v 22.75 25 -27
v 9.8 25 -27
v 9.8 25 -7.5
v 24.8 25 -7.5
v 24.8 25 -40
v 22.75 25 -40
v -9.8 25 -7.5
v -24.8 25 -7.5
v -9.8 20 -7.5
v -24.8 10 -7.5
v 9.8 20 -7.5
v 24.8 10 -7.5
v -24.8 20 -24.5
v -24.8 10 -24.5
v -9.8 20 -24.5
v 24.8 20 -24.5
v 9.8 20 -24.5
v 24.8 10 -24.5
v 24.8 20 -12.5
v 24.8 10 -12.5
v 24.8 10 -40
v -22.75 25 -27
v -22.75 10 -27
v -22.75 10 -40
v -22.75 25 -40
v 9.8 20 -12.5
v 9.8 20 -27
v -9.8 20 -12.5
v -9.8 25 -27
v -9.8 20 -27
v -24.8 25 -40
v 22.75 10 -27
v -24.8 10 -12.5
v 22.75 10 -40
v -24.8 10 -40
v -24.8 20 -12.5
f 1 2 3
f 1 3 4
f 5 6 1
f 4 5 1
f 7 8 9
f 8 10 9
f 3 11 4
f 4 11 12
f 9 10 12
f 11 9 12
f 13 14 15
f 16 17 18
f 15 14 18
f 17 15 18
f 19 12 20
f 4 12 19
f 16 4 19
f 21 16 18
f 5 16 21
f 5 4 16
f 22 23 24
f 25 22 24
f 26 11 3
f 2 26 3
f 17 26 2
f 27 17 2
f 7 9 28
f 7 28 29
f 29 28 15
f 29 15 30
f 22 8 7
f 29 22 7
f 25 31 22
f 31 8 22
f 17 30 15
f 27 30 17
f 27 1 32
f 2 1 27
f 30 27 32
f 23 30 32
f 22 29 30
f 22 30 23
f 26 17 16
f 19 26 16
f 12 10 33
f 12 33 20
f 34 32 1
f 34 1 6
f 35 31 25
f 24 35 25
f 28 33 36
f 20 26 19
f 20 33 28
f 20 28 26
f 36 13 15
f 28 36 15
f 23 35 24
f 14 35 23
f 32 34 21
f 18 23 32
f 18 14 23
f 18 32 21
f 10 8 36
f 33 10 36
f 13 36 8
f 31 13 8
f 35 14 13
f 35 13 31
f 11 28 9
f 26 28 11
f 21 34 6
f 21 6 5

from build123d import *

# Parameters (mm, degrees)
BOSS_EXTRUDE1_DEPTH     = 10
SKETCH2_W               = 17.2
SKETCH2_H               = 43
CUT_EXTRUDE1_DEPTH      = 72.414284285
SKETCH3_W               = 90
SKETCH3_H               = 34
SKETCH3_W_2             = 80
SKETCH3_H_2             = 24
BOSS_EXTRUDE3_DEPTH     = 15
SKETCH4_W               = 49.6
SKETCH4_H               = 5
BOSS_EXTRUDE4_DEPTH     = 10
SKETCH5_W               = 15
SKETCH5_H               = 22
BOSS_EXTRUDE5_DEPTH     = 5
SKETCH6_W               = 90
SKETCH6_H               = 77
BOSS_EXTRUDE6_DEPTH     = 15
BOSS_EXTRUDE8_DEPTH     = 39
CHAMFER1_SIZE           = 64
CHAMFER1_SIZE_2         = 3.354097874
CHAMFER2_SIZE           = 64
CHAMFER2_SIZE_2         = 11.405813635
CHAMFER3_SIZE           = 64
CHAMFER3_SIZE_2         = 13.775745352
CUT_EXTRUDE3_DEPTH      = 95.500525601
CUT_EXTRUDE3_DEPTH_BACK = 95.500525601
SKETCH10_W              = 50
SKETCH10_H              = 27
SKETCH15_R              = 8
CUT_EXTRUDE5_DEPTH      = 122.227059686
CUT_EXTRUDE6_DEPTH      = 2.5
SKETCH18_W              = 29.6
SKETCH18_H              = 43
CUT_EXTRUDE7_DEPTH      = 10
CUT_EXTRUDE8_DEPTH      = 15
SKETCH21_W              = 29.6
SKETCH21_H              = 33
BOSS_EXTRUDE10_DEPTH    = 2.5
SKETCH23_W              = 2.05
SKETCH23_H              = 13
BOSS_EXTRUDE11_DEPTH    = 15
SKETCH24_OUTSIDE_W      = 133.046
SKETCH24_OUTSIDE_H      = 133.046
SKETCH24_OUTSIDE_W_2    = 90
SKETCH24_OUTSIDE_H_2    = 72
CUT_EXTRUDE10_DEPTH     = 61.5
SKETCH26_W              = 100
SKETCH26_H              = 100
CUT_EXTRUDE13_DEPTH     = 10


with BuildPart() as part:
    # Sketch1 → Boss-Extrude1 (new body)
    with BuildSketch(Plane(origin=(0, 0, 0), x_dir=(1, 0, 0), z_dir=(0, 1, 0))):
        with BuildLine():
            Line((-35, 50), (35, 50))
            ThreePointArc((35, 50), (45.606601718, 45.606601718), (50, 35))
            Line((50, 35), (50, -35))
            ThreePointArc((50, -35), (45.606601718, -45.606601718), (35, -50))
            Line((35, -50), (-35, -50))
            ThreePointArc((-35, -50), (-45.606601718, -45.606601718), (-50, -35))
            Line((-50, -35), (-50, 35))
            ThreePointArc((-50, 35), (-45.606601718, 45.606601718), (-35, 50))
        make_face()
    extrude(amount=BOSS_EXTRUDE1_DEPTH)

    # Sketch2 → Cut-Extrude1 (cut, through all)
    with BuildSketch(Plane(origin=(0, 10, 0), x_dir=(1, 0, 0), z_dir=(0, 1, 0))):
        with Locations((-33.4, 18.5)):
            Rectangle(SKETCH2_W, SKETCH2_H)
        with Locations((33.4, 18.5)):
            Rectangle(SKETCH2_W, SKETCH2_H)
    extrude(amount=-CUT_EXTRUDE1_DEPTH, mode=Mode.SUBTRACT)

    # Sketch3 → Boss-Extrude3 (add)
    with BuildSketch(Plane(origin=(0, 10, 0), x_dir=(1, 0, 0), z_dir=(0, 1, 0))):
        with Locations((0, -20)):
            Rectangle(SKETCH3_W, SKETCH3_H)
        with Locations((0, -20)):
            Rectangle(SKETCH3_W_2, SKETCH3_H_2, mode=Mode.SUBTRACT)
    extrude(amount=BOSS_EXTRUDE3_DEPTH)

    # Sketch4 → Boss-Extrude4 (add)
    with BuildSketch(Plane(origin=(0, 10, 0), x_dir=(1, 0, 0), z_dir=(0, 1, 0))):
        with Locations((0, 10)):
            Rectangle(SKETCH4_W, SKETCH4_H)
        with Locations((0, 27)):
            Rectangle(SKETCH4_W, SKETCH4_H)
    extrude(amount=BOSS_EXTRUDE4_DEPTH)

    # Sketch5 → Boss-Extrude5 (add)
    with BuildSketch(Plane(origin=(0, 20, 0), x_dir=(1, 0, 0), z_dir=(0, 1, 0))):
        with Locations((-17.3, 18.5)):
            Rectangle(SKETCH5_W, SKETCH5_H)
        with Locations((17.3, 18.5)):
            Rectangle(SKETCH5_W, SKETCH5_H)
    extrude(amount=BOSS_EXTRUDE5_DEPTH)

    # Sketch6 → Boss-Extrude6 (add)
    with BuildSketch(Plane(origin=(0, 10, 0), x_dir=(1, 0, 0), z_dir=(0, 1, 0))):
        with BuildLine():
            Line((-50, 35), (-50, -35))
            ThreePointArc((-50, -35), (-45.606601718, -45.606601718), (-35, -50))
            Line((-35, -50), (35, -50))
            ThreePointArc((35, -50), (45.606601718, -45.606601718), (50, -35))
            Line((50, -35), (50, 35))
            ThreePointArc((50, 35), (45.606601718, 45.606601718), (35, 50))
            Line((35, 50), (-35, 50))
            ThreePointArc((-35, 50), (-45.606601718, 45.606601718), (-50, 35))
        make_face()
        with Locations((0, 1.5)):
            Rectangle(SKETCH6_W, SKETCH6_H, mode=Mode.SUBTRACT)
    extrude(amount=BOSS_EXTRUDE6_DEPTH)

    # Sketch9 → Boss-Extrude8 (add)
    with BuildSketch(Plane(origin=(0, 25, 0), x_dir=(1, 0, 0), z_dir=(0, 1, 0))):
        with BuildLine():
            Line((-50, 35), (-50, -35))
            ThreePointArc((-50, -35), (-45.606601718, -45.606601718), (-35, -50))
            Line((-35, -50), (35, -50))
            ThreePointArc((35, -50), (45.606601718, -45.606601718), (50, -35))
            Line((50, -35), (50, 35))
            ThreePointArc((50, 35), (45.606601718, 45.606601718), (35, 50))
            Line((35, 50), (-35, 50))
            ThreePointArc((-35, 50), (-45.606601718, 45.606601718), (-50, 35))
        make_face()
        with BuildLine():
            Line((-45, 35), (-45, -32))
            Line((-45, -32), (45, -32))
            Line((45, -32), (45, 35))
            ThreePointArc((45, 35), (44.659258263, 37.588190451), (43.660254038, 40))
            Line((43.660254038, 40), (-43.660254038, 40))
            ThreePointArc((-43.660254038, 40), (-44.659258263, 37.588190451), (-45, 35))
        make_face(mode=Mode.SUBTRACT)
    extrude(amount=BOSS_EXTRUDE8_DEPTH)

    # Chamfer1
    # the kernel refuses this chamfer: 64, 3.354097874 mm, written as the material it takes off along each edge
    with BuildSketch(Plane(origin=(-35, 64, 50), x_dir=(0, -0.9999979738662979, 0.002013023422382214), z_dir=(1, 0, 0)), Plane(origin=(50, 64, 35), x_dir=(0.002013023422382214, -0.9999979738662979, 0), z_dir=(0, 0, -1)), Plane(origin=(-50, 64, -35), x_dir=(-0.002013023422382214, -0.9999979738662979, 0), z_dir=(0, 0, 1)), Plane(origin=(35, 64, -50), x_dir=(0, -0.9999979738662979, -0.002013023422382214), z_dir=(-1, 0, 0))) as chamfer1_piece_1:
        Polygon((CHAMFER1_SIZE * 0.999997973866, CHAMFER1_SIZE * 0.00201302342238), (-CHAMFER1_SIZE_2 * 0.00201302342245, CHAMFER1_SIZE_2 * 0.9999979739), (0, 0), align=None)
    extrude(amount=70, mode=Mode.SUBTRACT)
    with BuildSketch(Plane(origin=(35, 64, 35), x_dir=(0, 0, 1), z_dir=(-1, 0, 0))) as chamfer1_piece_2:
        Polygon((15, -CHAMFER1_SIZE), (15 - CHAMFER1_SIZE_2, 0), (15, 0), align=None)
    revolve(axis=Axis((35, 64, 35), (0, 1, 0)), revolution_arc=90, mode=Mode.SUBTRACT)
    with BuildSketch(Plane(origin=(-35, 64, 35), x_dir=(-1, 0, 0), z_dir=(0, 0, -1))) as chamfer1_piece_3:
        Polygon((15, -CHAMFER1_SIZE), (15 - CHAMFER1_SIZE_2, 0), (15, 0), align=None)
    revolve(axis=Axis((-35, 64, 35), (0, 1, 0)), revolution_arc=90, mode=Mode.SUBTRACT)
    with BuildSketch(Plane(origin=(35, 64, -35), x_dir=(1, 0, 0), z_dir=(0, 0, 1))) as chamfer1_piece_4:
        Polygon((15, -CHAMFER1_SIZE), (15 - CHAMFER1_SIZE_2, 0), (15, 0), align=None)
    revolve(axis=Axis((35, 64, -35), (0, 1, 0)), revolution_arc=90, mode=Mode.SUBTRACT)
    with BuildSketch(Plane(origin=(-35, 64, -35), x_dir=(0, 0, -1), z_dir=(1, 0, 0))) as chamfer1_piece_5:
        Polygon((15 - CHAMFER1_SIZE_2, 0), (15, -CHAMFER1_SIZE), (15, 0), align=None)
    revolve(axis=Axis((-35, 64, -35), (0, 1, 0)), revolution_arc=90, mode=Mode.SUBTRACT)

    # Chamfer2
    # the kernel refuses this chamfer: 64, 11.405813635 mm, written as the material it takes off along each edge
    with BuildSketch(Plane(origin=(201.306482971, 64, -46.645902126), x_dir=(0, -0.9982575003065525, -0.05900816114499234), z_dir=(-1, 0, 0))) as chamfer2_piece_1:
        Polygon((CHAMFER2_SIZE * 0.999977671636, CHAMFER2_SIZE * 0.0066825316561), (-CHAMFER2_SIZE_2 * 0.0590081611462, CHAMFER2_SIZE_2 * 0.998257500326), (0, 0), align=None)
    extrude(amount=402.612965942, mode=Mode.SUBTRACT)

    # Chamfer3
    # the kernel refuses this chamfer: 64, 13.775745352 mm, written as the material it takes off along each edge
    with BuildSketch(Plane(origin=(-201.265469314, 64, 46.645902126), x_dir=(0, -0.9981787050157903, 0.06032638604292662), z_dir=(1, 0, 0))) as chamfer3_piece_1:
        Polygon((CHAMFER3_SIZE * 0.999967974892, CHAMFER3_SIZE * 0.00800307379952), (-CHAMFER3_SIZE_2 * 0.060326386045, CHAMFER3_SIZE_2 * 0.99817870505), (0, 0), align=None)
    extrude(amount=402.530938629, mode=Mode.SUBTRACT)

    # Sketch10 → Cut-Extrude3 (cut, two sides: drawn at the far end of the back side and taken through both)
    with BuildSketch(Plane(origin=(0, 1.307501734, 0), x_dir=(0, 0, 1), z_dir=(-1, 0, 0)).offset(-CUT_EXTRUDE3_DEPTH_BACK)):
        with Locations((-22.129843227, 49.192498266)):
            Rectangle(SKETCH10_W, SKETCH10_H)
    extrude(amount=CUT_EXTRUDE3_DEPTH + CUT_EXTRUDE3_DEPTH_BACK, mode=Mode.SUBTRACT)

    # Sketch15 → Cut-Extrude5 (cut, through all)
    with BuildSketch(Plane.XY.offset(-40)):
        with Locations((-12.75, 20.25)):
            Circle(SKETCH15_R)
        with Locations((12.75, 20.25)):
            Circle(SKETCH15_R)
    extrude(amount=-CUT_EXTRUDE5_DEPTH, mode=Mode.SUBTRACT)

    # Sketch17 → Cut-Extrude6 (cut)
    with BuildSketch(Plane(origin=(0, 0, -29.5), x_dir=(-1, 0, 0), z_dir=(0, 0, -1))):
        Polygon((-24.8, 10), (24.8, 10), (24.8, 25), (9.8, 25), (9.8, 20), (-9.8, 20), (-9.8, 25), (-24.8, 25), align=None)
    extrude(amount=-CUT_EXTRUDE6_DEPTH, mode=Mode.SUBTRACT)

    # Sketch18 → Cut-Extrude7 (cut)
    with BuildSketch(Plane.XZ):
        with Locations((0, -18.5)):
            Rectangle(SKETCH18_W, SKETCH18_H)
    extrude(amount=-CUT_EXTRUDE7_DEPTH, mode=Mode.SUBTRACT)

    # Sketch20 → Cut-Extrude8 (cut)
    with BuildSketch(Plane.XZ.offset(-25)):
        with BuildLine():
            Line((-45, -35), (-45, -40))
            Line((-45, -40), (-43.660254038, -40))
            ThreePointArc((-43.660254038, -40), (-44.659258263, -37.588190451), (-45, -35))
        make_face()
        with BuildLine():
            Line((45, -40), (45, -35))
            ThreePointArc((45, -35), (44.659258263, -37.588190451), (43.660254038, -40))
            Line((43.660254038, -40), (45, -40))
        make_face()
    extrude(amount=-CUT_EXTRUDE8_DEPTH, mode=Mode.SUBTRACT)

    # Sketch21 → Boss-Extrude10 (add)
    with BuildSketch(Plane.XZ):
        with Locations((0, -13.5)):
            Rectangle(SKETCH21_W, SKETCH21_H)
    extrude(amount=-BOSS_EXTRUDE10_DEPTH)

    # Sketch23 → Boss-Extrude11 (add)
    with BuildSketch(Plane(origin=(0, 10, 0), x_dir=(1, 0, 0), z_dir=(0, 1, 0))):
        with Locations((-23.775, 33.5)):
            Rectangle(SKETCH23_W, SKETCH23_H)
        with Locations((23.775, 33.5)):
            Rectangle(SKETCH23_W, SKETCH23_H)
    extrude(amount=BOSS_EXTRUDE11_DEPTH)

    # Sketch24 outside → Cut-Extrude10 (cut)
    with BuildSketch(Plane(origin=(0, 64, 0), x_dir=(1, 0, 0), z_dir=(0, 1, 0))):
        Rectangle(SKETCH24_OUTSIDE_W, SKETCH24_OUTSIDE_H)
        with Locations((0, 4)):
            Rectangle(SKETCH24_OUTSIDE_W_2, SKETCH24_OUTSIDE_H_2, mode=Mode.SUBTRACT)
    extrude(amount=-CUT_EXTRUDE10_DEPTH, mode=Mode.SUBTRACT)

    # Sketch26 → Cut-Extrude13 (cut)
    with BuildSketch(Plane.XZ):
        Rectangle(SKETCH26_W, SKETCH26_H)
    extrude(amount=-CUT_EXTRUDE13_DEPTH, mode=Mode.SUBTRACT)


with BuildPart() as body_2:
    # of the pieces the cut leaves, the one that is kept (cut_extrude13_keep)
    add(part.part.solids().sort_by_distance((24.8, 25, -7.5))[0])


solid = body_2.part
